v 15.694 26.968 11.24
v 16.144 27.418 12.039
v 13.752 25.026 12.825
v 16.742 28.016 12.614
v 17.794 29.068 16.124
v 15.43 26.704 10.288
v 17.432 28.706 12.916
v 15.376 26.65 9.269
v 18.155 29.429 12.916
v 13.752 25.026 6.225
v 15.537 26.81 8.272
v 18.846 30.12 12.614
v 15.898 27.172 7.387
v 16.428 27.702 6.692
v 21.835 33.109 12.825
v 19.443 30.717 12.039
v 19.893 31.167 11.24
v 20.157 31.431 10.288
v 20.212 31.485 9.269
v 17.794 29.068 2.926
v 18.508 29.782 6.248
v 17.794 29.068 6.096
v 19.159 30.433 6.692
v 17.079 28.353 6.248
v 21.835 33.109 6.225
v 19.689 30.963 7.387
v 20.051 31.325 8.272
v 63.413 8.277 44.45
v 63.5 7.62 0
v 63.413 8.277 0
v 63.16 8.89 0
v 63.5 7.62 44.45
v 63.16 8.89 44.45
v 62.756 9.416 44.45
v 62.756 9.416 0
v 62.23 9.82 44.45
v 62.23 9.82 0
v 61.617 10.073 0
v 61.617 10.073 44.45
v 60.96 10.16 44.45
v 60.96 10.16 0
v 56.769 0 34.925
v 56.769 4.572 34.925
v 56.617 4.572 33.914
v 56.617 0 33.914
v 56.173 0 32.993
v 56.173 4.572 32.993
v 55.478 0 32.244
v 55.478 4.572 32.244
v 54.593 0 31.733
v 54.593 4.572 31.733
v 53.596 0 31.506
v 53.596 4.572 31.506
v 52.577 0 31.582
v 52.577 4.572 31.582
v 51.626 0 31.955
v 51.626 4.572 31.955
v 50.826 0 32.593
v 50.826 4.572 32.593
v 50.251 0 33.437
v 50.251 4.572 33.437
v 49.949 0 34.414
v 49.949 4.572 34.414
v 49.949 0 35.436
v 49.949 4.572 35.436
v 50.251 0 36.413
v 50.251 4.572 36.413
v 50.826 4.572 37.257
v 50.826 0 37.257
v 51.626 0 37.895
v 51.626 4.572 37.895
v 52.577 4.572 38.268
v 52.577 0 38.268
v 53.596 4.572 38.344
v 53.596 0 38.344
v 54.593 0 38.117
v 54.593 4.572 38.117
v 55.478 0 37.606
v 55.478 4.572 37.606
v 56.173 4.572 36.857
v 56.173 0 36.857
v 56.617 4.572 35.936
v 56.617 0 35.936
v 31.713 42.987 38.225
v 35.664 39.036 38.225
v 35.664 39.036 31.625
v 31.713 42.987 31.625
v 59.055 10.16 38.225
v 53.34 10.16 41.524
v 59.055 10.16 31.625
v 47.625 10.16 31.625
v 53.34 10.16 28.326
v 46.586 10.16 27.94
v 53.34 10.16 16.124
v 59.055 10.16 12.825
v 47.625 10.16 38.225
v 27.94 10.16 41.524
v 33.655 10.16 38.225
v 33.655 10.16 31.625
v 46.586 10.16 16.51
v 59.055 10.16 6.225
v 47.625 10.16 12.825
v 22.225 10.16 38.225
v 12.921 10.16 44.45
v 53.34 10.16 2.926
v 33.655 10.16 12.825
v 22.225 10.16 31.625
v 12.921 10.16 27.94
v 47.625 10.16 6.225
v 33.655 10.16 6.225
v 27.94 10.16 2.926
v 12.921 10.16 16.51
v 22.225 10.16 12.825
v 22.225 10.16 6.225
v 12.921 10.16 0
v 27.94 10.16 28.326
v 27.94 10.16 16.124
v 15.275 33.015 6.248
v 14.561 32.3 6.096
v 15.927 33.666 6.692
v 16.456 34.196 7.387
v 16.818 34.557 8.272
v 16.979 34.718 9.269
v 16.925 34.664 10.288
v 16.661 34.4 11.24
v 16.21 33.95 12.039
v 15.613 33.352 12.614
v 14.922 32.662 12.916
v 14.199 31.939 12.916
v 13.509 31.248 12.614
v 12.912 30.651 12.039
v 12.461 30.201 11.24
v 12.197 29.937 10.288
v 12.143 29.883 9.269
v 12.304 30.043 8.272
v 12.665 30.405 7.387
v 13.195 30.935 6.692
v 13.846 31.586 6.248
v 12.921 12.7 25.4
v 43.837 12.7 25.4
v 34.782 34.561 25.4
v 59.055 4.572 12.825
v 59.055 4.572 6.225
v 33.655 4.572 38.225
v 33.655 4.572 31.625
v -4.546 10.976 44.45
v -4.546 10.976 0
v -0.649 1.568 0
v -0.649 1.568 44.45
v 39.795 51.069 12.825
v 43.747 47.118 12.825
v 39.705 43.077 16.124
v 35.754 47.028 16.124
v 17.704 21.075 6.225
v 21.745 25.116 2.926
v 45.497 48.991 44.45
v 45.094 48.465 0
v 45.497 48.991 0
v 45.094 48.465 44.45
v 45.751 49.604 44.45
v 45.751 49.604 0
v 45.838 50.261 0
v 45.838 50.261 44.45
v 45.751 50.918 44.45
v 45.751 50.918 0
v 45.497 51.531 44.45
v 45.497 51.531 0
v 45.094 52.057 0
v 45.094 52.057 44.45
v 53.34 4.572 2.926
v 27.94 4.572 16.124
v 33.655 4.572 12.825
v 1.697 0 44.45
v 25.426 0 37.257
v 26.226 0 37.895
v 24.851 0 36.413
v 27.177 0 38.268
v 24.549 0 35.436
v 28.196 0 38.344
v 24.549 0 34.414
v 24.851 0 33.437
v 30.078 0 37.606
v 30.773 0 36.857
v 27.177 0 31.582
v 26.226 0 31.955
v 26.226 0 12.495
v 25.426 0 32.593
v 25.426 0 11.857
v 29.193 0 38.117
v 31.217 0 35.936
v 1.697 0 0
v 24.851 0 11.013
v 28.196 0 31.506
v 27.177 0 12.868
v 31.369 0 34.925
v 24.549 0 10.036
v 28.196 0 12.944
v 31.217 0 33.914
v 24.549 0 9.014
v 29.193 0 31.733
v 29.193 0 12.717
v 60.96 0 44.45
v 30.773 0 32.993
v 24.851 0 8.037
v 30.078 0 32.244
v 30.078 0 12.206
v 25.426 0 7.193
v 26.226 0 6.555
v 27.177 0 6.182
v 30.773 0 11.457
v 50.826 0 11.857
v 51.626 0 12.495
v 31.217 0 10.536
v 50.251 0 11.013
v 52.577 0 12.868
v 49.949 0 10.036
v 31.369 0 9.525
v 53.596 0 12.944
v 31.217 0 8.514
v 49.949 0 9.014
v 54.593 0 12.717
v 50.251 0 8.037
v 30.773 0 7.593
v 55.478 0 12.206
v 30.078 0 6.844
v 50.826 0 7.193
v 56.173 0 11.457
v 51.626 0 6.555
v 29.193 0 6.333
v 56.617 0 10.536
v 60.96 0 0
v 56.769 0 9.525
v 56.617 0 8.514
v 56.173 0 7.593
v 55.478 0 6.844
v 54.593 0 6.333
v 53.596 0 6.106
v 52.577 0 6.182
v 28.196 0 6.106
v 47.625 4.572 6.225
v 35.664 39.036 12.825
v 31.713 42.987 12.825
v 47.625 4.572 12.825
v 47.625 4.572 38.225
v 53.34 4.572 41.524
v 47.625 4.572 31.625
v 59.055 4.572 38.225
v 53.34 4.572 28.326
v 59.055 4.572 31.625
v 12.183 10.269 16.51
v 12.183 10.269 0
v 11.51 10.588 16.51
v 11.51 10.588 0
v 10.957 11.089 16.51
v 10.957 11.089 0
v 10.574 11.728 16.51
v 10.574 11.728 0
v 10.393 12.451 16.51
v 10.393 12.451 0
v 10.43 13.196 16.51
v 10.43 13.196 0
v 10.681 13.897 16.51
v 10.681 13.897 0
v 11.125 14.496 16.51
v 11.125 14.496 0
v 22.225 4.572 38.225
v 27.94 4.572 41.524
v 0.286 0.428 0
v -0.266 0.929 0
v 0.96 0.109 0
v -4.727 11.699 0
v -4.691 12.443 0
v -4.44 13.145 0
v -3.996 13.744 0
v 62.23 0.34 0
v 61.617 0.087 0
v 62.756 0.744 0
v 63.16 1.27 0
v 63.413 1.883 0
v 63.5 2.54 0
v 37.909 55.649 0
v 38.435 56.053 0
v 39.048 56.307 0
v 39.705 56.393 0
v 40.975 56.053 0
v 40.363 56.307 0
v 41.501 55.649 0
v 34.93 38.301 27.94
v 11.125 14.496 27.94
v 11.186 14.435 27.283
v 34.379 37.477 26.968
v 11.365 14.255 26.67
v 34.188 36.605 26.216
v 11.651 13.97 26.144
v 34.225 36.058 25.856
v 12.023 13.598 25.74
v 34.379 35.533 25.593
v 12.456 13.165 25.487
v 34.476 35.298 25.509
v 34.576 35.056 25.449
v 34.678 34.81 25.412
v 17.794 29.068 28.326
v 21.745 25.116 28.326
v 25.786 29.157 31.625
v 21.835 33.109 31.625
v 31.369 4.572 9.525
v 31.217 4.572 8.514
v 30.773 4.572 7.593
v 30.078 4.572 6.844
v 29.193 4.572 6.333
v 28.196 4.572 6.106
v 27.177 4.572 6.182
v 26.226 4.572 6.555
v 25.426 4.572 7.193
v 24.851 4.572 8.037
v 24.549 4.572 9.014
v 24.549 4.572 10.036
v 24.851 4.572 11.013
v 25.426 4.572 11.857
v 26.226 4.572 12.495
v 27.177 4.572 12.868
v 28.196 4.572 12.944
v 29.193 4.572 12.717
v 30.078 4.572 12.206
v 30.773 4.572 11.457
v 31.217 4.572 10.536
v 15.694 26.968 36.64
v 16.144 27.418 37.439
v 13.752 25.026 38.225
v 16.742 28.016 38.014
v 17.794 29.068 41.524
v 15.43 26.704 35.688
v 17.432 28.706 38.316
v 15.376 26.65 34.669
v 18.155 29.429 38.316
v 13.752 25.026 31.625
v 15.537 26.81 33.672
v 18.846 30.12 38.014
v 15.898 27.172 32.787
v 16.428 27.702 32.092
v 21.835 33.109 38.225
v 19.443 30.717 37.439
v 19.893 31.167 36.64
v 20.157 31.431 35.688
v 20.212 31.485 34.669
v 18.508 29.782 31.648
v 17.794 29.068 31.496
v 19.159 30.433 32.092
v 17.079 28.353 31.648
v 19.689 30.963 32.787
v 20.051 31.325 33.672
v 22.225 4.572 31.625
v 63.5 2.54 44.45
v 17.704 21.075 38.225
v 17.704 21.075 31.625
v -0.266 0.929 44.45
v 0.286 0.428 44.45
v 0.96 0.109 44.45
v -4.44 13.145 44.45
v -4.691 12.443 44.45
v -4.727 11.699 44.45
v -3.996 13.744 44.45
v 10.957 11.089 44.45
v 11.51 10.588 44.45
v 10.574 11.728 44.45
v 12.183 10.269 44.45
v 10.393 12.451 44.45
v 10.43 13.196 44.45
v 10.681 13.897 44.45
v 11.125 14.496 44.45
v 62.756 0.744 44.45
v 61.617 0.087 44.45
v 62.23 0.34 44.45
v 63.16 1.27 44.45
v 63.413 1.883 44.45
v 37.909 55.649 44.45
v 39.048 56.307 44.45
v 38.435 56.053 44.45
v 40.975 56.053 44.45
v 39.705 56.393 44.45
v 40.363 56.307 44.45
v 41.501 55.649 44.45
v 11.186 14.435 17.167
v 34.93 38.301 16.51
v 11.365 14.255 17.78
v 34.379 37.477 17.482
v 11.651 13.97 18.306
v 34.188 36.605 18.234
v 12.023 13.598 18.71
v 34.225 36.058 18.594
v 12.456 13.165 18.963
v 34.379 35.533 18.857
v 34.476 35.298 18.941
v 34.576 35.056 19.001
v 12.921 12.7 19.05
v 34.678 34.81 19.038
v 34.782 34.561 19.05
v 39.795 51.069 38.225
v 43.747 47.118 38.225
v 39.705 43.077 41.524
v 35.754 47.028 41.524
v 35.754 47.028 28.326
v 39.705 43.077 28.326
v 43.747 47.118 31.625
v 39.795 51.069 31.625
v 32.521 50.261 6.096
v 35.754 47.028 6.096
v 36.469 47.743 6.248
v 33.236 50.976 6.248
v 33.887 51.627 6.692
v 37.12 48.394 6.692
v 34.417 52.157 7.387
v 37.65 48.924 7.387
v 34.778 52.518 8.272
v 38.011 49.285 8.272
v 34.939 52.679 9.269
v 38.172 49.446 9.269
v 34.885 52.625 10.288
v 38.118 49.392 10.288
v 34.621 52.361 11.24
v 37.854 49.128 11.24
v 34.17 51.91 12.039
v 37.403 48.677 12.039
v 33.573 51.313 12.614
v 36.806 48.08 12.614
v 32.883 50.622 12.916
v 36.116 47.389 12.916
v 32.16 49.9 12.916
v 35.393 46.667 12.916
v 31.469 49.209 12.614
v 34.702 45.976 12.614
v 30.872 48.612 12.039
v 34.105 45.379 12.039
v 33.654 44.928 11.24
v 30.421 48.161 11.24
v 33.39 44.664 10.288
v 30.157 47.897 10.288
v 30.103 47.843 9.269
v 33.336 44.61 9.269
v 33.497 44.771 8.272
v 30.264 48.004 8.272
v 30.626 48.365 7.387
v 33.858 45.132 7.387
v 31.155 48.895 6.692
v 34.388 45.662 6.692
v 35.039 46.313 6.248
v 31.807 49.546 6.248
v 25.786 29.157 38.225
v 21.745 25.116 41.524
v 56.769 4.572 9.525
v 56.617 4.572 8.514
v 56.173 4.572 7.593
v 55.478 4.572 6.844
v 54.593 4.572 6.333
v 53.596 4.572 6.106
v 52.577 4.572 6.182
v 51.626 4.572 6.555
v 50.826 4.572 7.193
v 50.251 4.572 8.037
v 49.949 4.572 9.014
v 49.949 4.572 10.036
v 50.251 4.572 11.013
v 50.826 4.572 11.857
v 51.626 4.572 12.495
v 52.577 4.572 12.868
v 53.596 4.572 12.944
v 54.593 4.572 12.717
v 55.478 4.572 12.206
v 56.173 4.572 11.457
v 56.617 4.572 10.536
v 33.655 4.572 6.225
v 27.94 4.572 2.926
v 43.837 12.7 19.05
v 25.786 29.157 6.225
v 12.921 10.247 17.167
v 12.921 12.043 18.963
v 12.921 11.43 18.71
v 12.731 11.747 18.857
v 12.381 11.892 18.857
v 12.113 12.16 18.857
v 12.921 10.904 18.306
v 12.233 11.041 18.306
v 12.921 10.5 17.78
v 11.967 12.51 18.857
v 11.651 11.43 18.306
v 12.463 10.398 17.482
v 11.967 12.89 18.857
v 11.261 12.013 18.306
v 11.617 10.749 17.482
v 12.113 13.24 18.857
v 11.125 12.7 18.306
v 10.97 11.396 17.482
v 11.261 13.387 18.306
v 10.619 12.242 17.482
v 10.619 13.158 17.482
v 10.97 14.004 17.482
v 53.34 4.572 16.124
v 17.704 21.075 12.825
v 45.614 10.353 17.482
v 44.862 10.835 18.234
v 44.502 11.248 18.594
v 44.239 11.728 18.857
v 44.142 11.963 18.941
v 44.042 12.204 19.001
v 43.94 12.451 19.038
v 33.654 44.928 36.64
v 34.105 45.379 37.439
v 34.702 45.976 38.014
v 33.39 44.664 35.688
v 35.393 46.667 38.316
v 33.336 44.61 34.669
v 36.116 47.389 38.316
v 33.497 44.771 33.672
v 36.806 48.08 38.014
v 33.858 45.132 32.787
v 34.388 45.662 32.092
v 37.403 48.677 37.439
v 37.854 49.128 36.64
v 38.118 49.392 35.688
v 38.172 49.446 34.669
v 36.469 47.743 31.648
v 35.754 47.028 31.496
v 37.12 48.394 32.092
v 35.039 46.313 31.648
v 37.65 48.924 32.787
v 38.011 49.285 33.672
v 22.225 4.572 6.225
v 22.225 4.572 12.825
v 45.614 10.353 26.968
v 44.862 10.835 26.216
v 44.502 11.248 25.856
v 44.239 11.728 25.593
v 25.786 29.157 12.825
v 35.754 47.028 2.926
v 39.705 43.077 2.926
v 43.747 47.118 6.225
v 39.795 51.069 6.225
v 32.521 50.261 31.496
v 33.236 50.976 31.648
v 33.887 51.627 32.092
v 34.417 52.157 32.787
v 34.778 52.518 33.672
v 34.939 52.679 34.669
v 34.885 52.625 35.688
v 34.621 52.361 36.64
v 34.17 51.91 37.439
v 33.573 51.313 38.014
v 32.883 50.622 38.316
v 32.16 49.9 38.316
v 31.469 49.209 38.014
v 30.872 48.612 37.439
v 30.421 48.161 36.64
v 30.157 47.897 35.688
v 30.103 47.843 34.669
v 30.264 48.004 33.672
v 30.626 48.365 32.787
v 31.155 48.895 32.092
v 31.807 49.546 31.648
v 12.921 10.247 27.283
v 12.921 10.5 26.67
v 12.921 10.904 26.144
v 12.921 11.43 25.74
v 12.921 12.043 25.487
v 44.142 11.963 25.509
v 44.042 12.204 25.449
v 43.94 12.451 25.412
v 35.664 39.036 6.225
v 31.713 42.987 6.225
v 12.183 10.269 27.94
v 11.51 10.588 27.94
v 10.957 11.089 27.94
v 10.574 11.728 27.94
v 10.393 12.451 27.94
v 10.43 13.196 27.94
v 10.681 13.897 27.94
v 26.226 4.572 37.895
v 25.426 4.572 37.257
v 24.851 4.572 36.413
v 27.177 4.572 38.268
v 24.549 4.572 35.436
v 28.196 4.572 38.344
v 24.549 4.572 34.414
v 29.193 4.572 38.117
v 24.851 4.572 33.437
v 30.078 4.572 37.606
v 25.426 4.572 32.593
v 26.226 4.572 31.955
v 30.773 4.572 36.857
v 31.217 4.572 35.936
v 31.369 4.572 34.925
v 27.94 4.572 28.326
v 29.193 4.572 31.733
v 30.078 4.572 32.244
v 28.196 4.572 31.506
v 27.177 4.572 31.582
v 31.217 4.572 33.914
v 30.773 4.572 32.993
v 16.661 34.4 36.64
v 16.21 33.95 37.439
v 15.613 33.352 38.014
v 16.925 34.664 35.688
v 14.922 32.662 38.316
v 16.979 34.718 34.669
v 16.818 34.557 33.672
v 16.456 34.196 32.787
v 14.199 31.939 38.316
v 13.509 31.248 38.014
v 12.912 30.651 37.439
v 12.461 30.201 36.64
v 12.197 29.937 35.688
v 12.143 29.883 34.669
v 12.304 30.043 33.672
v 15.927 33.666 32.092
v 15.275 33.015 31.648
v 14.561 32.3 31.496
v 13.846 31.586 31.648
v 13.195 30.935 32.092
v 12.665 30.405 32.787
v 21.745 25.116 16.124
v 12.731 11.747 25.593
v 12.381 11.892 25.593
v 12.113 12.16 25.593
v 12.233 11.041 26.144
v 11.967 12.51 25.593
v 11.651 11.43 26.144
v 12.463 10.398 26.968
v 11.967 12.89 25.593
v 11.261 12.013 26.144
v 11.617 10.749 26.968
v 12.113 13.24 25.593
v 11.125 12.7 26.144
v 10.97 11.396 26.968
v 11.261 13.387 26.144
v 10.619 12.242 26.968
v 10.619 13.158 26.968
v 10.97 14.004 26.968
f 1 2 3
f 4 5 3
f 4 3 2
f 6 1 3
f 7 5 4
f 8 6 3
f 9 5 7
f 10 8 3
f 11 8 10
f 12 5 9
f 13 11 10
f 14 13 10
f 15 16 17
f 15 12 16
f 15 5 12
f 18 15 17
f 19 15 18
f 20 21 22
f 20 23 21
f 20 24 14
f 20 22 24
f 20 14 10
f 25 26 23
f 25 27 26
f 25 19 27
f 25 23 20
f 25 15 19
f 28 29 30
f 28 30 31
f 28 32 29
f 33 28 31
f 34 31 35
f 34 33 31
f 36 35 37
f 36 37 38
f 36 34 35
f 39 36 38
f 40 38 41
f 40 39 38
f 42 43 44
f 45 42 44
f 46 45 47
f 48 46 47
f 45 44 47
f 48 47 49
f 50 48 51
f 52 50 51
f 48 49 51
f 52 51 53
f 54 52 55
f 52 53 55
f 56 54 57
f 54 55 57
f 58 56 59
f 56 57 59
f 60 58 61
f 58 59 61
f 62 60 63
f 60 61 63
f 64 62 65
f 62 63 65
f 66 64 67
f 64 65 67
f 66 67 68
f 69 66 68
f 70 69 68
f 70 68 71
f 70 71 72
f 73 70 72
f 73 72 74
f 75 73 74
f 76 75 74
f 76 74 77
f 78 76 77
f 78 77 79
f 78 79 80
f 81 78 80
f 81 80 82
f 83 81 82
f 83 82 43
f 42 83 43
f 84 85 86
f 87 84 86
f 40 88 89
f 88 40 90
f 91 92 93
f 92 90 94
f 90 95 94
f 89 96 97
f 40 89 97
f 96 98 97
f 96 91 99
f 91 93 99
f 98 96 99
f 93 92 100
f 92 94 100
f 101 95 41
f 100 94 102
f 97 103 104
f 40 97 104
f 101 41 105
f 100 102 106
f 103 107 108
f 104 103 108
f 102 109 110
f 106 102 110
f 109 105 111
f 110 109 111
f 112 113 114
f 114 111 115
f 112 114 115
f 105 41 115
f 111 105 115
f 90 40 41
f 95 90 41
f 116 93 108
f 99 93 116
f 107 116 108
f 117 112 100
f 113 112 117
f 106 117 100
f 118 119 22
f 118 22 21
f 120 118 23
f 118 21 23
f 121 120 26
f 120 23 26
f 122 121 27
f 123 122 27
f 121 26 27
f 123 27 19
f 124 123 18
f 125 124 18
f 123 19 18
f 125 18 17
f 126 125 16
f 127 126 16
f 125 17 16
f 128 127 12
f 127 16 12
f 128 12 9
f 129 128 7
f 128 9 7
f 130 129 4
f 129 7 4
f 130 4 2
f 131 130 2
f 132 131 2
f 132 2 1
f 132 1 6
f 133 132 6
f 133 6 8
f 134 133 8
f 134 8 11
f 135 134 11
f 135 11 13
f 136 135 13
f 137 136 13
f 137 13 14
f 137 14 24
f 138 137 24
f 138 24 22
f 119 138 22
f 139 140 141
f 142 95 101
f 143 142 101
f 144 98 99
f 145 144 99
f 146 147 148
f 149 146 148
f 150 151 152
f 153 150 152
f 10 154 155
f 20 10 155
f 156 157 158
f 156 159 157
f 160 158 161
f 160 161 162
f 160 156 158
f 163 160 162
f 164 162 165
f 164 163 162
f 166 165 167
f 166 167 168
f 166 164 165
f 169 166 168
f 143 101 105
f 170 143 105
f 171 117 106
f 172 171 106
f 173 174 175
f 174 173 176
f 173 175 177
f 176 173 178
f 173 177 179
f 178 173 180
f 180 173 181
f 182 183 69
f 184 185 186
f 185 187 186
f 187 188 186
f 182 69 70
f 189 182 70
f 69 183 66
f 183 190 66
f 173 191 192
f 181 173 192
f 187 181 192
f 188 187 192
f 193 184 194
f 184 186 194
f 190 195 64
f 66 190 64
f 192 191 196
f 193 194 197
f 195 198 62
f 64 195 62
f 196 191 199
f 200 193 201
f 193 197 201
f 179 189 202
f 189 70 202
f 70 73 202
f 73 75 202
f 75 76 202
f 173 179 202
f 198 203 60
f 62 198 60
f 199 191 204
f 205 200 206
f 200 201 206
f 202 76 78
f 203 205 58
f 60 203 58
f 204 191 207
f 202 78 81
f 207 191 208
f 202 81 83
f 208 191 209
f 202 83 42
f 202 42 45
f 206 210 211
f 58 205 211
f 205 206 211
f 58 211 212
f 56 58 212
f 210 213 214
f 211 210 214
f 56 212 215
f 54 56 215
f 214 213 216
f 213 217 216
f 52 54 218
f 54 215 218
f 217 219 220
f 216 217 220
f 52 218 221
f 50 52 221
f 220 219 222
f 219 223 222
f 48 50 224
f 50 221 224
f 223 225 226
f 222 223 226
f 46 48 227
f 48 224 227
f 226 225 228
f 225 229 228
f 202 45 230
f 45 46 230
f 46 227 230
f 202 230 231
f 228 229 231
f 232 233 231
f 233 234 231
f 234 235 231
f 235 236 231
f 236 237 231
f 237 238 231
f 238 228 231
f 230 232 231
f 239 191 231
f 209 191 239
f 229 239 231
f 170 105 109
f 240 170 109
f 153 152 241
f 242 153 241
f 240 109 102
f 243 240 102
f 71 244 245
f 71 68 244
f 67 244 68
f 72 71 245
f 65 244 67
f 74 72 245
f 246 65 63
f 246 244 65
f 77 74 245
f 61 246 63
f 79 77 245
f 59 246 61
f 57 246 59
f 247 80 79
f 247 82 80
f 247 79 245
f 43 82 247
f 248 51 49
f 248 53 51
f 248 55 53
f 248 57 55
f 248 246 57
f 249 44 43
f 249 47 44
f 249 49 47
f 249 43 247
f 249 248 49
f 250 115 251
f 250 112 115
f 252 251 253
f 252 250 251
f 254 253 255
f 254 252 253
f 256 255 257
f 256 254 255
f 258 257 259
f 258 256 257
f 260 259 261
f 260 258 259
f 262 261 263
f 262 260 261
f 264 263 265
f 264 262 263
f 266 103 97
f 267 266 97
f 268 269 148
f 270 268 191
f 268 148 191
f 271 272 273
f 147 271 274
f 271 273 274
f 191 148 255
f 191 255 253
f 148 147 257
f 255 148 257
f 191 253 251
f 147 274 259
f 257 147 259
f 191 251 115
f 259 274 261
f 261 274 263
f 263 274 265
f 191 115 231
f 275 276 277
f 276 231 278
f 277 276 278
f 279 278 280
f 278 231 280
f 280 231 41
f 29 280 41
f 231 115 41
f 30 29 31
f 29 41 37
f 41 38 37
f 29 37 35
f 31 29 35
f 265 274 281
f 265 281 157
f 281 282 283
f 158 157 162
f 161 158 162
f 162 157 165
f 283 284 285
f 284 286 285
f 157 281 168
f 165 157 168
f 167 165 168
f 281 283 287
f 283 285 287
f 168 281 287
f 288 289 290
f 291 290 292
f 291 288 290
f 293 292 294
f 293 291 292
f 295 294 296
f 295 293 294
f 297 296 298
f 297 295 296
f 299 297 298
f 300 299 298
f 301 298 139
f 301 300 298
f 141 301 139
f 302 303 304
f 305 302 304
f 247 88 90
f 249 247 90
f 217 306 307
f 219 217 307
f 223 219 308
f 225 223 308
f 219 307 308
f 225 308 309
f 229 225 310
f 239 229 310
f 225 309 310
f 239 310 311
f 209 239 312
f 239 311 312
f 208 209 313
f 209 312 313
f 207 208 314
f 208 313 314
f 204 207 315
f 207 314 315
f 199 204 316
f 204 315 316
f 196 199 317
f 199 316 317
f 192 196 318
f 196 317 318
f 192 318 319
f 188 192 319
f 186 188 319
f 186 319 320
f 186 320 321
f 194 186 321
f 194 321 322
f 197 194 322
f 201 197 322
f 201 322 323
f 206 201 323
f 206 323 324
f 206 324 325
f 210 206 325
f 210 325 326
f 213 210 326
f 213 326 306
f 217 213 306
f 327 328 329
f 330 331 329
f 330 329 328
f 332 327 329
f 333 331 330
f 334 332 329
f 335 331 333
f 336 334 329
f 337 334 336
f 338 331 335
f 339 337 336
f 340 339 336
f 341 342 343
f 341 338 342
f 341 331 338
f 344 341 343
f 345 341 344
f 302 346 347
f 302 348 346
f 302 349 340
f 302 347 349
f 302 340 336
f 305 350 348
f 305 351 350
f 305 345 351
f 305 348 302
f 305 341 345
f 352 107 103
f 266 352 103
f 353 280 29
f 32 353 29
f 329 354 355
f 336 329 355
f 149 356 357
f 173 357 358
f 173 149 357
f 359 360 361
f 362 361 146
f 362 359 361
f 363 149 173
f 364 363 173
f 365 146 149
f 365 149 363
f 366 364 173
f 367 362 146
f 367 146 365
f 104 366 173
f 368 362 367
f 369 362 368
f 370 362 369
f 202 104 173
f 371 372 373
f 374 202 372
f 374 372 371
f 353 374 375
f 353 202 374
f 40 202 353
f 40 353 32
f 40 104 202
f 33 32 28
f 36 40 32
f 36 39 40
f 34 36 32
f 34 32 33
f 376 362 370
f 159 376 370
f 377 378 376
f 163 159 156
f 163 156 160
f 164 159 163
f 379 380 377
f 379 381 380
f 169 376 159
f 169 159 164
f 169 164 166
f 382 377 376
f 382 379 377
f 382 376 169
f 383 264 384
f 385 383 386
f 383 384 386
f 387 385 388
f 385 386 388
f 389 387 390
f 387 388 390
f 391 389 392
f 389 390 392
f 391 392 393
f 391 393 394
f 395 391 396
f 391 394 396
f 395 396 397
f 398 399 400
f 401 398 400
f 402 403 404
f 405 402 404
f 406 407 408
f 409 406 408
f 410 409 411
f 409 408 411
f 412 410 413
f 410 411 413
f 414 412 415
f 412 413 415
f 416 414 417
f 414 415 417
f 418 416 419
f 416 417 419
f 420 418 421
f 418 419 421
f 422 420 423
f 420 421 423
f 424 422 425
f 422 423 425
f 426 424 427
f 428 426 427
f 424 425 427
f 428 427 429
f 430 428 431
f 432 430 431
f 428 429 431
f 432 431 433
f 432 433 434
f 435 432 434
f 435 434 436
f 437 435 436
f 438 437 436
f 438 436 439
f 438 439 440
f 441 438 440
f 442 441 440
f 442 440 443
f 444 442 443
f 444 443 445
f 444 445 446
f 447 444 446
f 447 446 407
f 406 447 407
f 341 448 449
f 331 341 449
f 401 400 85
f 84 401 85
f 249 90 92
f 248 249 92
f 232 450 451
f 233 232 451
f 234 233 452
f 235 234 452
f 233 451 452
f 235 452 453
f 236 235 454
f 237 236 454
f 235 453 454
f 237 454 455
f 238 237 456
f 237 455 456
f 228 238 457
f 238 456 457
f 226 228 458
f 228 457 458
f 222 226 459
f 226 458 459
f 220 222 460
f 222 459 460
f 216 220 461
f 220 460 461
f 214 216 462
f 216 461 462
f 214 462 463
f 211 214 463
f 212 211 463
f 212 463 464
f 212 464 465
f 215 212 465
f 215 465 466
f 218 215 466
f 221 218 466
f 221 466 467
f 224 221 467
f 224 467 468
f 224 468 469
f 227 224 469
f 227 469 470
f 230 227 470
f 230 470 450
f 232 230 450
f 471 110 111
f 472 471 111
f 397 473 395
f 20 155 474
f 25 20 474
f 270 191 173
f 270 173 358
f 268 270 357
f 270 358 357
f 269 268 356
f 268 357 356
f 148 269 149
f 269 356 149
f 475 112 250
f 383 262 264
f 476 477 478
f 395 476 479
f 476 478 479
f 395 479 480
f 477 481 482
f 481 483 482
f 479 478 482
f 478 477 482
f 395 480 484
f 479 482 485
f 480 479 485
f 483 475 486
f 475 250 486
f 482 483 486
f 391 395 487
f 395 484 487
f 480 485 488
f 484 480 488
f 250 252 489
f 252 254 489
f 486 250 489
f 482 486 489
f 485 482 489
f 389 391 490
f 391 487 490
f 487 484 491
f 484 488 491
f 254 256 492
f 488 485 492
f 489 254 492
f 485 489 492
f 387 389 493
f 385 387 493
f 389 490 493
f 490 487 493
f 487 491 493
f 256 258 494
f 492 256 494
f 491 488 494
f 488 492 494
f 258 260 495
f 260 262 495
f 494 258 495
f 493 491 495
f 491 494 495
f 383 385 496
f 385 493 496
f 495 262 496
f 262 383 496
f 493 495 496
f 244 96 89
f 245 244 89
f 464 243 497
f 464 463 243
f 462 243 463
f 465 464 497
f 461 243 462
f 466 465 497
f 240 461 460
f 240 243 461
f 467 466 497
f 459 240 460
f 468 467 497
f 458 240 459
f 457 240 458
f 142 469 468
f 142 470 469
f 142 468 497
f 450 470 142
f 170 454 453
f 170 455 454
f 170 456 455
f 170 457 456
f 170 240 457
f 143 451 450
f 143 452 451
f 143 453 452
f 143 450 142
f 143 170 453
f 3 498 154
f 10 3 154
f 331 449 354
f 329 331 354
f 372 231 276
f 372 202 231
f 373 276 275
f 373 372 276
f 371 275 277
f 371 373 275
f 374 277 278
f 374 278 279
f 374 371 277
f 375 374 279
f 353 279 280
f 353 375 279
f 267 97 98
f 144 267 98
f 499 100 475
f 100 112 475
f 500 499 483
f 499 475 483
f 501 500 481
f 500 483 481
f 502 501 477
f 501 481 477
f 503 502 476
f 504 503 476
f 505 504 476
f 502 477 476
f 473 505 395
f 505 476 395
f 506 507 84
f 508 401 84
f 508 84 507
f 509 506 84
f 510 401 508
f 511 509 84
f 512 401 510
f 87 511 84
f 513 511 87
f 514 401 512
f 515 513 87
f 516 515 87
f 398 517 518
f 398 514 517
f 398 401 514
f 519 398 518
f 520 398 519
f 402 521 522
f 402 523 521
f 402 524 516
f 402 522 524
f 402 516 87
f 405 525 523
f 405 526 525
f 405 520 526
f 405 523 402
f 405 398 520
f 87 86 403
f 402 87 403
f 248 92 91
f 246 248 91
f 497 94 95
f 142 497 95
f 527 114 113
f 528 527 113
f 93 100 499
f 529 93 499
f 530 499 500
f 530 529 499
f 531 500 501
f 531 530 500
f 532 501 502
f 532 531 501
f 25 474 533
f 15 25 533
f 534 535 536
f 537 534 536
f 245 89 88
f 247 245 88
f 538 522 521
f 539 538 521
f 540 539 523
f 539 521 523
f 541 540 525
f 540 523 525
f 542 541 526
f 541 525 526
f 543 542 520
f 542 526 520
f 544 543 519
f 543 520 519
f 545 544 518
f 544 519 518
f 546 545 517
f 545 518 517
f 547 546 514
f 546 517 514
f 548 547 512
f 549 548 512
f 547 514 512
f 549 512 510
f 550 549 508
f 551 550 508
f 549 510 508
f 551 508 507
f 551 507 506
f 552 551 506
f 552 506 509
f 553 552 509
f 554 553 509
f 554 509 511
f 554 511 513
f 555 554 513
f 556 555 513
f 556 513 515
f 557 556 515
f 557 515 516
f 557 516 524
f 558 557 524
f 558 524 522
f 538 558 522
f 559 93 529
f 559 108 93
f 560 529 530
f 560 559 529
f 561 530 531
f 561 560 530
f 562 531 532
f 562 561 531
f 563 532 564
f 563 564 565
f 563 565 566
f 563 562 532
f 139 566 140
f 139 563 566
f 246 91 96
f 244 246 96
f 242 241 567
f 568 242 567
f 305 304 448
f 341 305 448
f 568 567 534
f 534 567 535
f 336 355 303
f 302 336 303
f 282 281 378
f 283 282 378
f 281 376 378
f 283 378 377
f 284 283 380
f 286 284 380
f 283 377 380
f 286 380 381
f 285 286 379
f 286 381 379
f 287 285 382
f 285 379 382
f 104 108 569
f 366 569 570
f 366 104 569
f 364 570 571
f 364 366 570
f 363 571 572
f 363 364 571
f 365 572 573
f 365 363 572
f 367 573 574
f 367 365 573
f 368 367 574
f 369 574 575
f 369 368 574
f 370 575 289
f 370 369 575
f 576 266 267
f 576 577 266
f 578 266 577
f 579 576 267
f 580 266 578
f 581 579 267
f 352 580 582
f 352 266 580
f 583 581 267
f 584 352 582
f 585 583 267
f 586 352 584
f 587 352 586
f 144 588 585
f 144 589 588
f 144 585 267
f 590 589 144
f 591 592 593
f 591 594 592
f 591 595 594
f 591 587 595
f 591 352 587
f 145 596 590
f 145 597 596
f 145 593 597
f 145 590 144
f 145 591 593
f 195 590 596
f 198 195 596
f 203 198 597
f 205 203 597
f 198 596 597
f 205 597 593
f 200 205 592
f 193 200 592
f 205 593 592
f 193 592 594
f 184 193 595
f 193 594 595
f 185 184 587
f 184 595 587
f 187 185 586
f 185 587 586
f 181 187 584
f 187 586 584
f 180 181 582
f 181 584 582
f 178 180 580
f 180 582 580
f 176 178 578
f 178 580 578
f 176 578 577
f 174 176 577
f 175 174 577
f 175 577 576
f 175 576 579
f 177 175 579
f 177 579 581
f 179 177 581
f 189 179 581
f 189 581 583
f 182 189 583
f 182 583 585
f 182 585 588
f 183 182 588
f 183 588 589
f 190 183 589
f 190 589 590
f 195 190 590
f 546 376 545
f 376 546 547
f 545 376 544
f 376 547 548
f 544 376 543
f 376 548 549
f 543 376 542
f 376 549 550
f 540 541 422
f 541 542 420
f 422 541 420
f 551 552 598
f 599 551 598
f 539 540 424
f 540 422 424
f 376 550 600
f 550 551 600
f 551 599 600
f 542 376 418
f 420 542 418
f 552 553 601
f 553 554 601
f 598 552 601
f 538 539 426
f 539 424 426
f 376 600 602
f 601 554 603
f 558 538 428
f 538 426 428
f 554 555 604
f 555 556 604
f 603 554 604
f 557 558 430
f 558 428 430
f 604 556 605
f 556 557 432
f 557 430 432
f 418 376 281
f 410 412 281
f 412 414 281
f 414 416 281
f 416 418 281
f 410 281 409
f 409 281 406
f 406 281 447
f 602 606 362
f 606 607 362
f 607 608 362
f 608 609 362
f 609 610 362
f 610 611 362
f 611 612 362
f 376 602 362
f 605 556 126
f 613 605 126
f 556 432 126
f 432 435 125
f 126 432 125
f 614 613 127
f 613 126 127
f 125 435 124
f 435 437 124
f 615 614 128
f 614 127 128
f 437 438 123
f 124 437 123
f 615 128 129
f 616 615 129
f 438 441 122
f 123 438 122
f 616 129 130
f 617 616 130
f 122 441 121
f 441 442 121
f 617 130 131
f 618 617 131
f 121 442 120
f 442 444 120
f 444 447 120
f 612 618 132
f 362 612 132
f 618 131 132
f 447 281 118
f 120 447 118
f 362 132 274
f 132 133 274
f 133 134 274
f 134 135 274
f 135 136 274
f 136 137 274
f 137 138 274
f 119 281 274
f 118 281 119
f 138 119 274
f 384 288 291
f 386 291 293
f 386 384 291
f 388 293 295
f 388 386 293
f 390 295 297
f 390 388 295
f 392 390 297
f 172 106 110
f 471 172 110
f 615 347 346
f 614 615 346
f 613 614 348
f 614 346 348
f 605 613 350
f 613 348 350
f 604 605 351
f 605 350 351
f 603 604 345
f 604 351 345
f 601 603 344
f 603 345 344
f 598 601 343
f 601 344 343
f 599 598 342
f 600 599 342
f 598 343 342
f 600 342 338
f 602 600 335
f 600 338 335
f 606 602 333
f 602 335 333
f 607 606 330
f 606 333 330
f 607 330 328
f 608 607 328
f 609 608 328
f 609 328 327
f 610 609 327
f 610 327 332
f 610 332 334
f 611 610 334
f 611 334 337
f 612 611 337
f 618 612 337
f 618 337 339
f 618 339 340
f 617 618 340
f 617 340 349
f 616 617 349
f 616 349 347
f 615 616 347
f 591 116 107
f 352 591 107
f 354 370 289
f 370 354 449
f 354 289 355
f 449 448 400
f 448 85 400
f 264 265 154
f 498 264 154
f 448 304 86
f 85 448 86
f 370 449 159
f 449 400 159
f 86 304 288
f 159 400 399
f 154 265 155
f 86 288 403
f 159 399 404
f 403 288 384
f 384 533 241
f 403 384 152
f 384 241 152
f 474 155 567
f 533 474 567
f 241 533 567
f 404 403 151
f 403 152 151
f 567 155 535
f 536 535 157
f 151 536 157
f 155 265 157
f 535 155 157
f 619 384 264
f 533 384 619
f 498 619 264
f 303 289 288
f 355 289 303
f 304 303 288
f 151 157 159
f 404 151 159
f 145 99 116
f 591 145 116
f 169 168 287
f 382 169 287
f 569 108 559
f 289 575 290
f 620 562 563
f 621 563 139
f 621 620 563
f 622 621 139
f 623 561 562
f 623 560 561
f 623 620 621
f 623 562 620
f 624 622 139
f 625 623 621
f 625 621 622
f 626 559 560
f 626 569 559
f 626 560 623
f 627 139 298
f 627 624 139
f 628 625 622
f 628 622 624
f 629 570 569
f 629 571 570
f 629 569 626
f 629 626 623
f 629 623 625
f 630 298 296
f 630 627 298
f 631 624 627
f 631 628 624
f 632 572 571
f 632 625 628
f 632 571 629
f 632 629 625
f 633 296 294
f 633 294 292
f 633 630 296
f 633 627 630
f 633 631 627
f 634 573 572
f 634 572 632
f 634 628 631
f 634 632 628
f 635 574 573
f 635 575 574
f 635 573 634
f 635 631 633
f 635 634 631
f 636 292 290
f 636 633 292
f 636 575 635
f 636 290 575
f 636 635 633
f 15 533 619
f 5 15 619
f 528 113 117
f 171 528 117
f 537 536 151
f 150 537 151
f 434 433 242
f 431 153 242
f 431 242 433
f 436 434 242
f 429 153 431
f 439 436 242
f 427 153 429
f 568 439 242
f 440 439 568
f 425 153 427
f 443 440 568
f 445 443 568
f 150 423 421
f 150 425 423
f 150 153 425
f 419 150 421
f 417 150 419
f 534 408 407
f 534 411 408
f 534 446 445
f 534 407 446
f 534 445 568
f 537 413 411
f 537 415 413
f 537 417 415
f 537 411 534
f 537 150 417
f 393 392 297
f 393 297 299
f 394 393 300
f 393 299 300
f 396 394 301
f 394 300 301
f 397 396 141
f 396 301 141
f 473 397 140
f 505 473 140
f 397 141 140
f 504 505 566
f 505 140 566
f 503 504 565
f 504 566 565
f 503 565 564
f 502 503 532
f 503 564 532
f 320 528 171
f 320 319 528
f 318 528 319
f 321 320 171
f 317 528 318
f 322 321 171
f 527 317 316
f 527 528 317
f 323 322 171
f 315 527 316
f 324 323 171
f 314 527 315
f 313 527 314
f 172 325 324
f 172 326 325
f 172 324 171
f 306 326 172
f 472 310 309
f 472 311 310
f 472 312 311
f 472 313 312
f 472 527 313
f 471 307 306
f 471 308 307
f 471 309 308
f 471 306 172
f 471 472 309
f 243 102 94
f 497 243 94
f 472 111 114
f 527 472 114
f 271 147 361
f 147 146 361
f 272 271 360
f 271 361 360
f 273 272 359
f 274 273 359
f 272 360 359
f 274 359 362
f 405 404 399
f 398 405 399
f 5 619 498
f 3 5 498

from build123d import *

# Parameters (mm, degrees)
BOSS_EXTRUDE1_DEPTH = 44.45
SKETCH2_R           = 3.429
CUT_EXTRUDE1_DEPTH  = 44.45
SKETCH3_R           = 3.429
CUT_EXTRUDE2_DEPTH  = 44.45
CUT_EXTRUDE3_DEPTH  = 5.588
CUT_EXTRUDE4_DEPTH  = 5.588
BOSS_EXTRUDE2_DEPTH = 3.175
FILLET1_R           = 2.54


with BuildPart() as part:
    # Sketch1 → Boss-Extrude1 (new body)
    with BuildSketch(Plane.XY):
        Polygon((0, 0), (63.5, 0), (63.5, 10.16), (6.788694961, 10.16), (46.889643324, 50.260948363), (39.705438427, 57.44515326), (-5.195842178, 12.543872654), align=None)
    extrude(amount=BOSS_EXTRUDE1_DEPTH)

    # Sketch2 → Cut-Extrude1 (cut)
    with BuildSketch(Plane(origin=(0, 10.16, 0), x_dir=(1, 0, 0), z_dir=(0, 1, 0))):
        with Locations((53.34, -34.925)):
            Circle(SKETCH2_R)
        with Locations((53.34, -9.525)):
            Circle(SKETCH2_R)
        with Locations((27.94, -9.525)):
            Circle(SKETCH2_R)
        with Locations((27.94, -34.925)):
            Circle(SKETCH2_R)
    extrude(amount=-CUT_EXTRUDE1_DEPTH, mode=Mode.SUBTRACT)

    # Sketch3 → Cut-Extrude2 (cut)
    with BuildSketch(Plane(origin=(-1.685652519, 1.685652519, 0), x_dir=(0, 0, -1), z_dir=(0.707106781, -0.707106781, 0))):
        with Locations((-9.525, 33.135842178)):
            Circle(SKETCH3_R)
        with Locations((-9.525, 58.535842178)):
            Circle(SKETCH3_R)
        with Locations((-34.925, 58.535842178)):
            Circle(SKETCH3_R)
        with Locations((-34.925, 33.135842178)):
            Circle(SKETCH3_R)
    extrude(amount=-CUT_EXTRUDE2_DEPTH, mode=Mode.SUBTRACT)

    # Sketch4 → Cut-Extrude3 (cut)
    with BuildSketch(Plane(origin=(0, 10.16, 0), x_dir=(1, 0, 0), z_dir=(0, 1, 0))):
        Polygon((22.225, -31.625443212), (22.225, -38.224556788), (27.94, -41.524113577), (33.655, -38.224556788), (33.655, -31.625443212), (27.94, -28.325886423), align=None)
        Polygon((47.625, -31.625443212), (47.625, -38.224556788), (53.34, -41.524113577), (59.055, -38.224556788), (59.055, -31.625443212), (53.34, -28.325886423), align=None)
        Polygon((22.225, -6.225443212), (22.225, -12.824556788), (27.94, -16.124113577), (33.655, -12.824556788), (33.655, -6.225443212), (27.94, -2.925886423), align=None)
        Polygon((47.625, -6.225443212), (47.625, -12.824556788), (53.34, -16.124113577), (59.055, -12.824556788), (59.055, -6.225443212), (53.34, -2.925886423), align=None)
    extrude(amount=-CUT_EXTRUDE3_DEPTH, mode=Mode.SUBTRACT)

    # Sketch5 → Cut-Extrude4 (cut)
    with BuildSketch(Plane(origin=(-1.685652519, 1.685652519, 0), x_dir=(0, 0, -1), z_dir=(0.707106781, -0.707106781, 0))):
        Polygon((-2.925886423, 58.535842178), (-6.225443212, 64.250842178), (-12.824556788, 64.250842178), (-16.124113577, 58.535842178), (-12.824556788, 52.820842178), (-6.225443212, 52.820842178), align=None)
        Polygon((-28.325886423, 58.535842178), (-31.625443212, 64.250842178), (-38.224556788, 64.250842178), (-41.524113577, 58.535842178), (-38.224556788, 52.820842178), (-31.625443212, 52.820842178), align=None)
        Polygon((-2.925886423, 33.135842178), (-6.225443212, 38.850842178), (-12.824556788, 38.850842178), (-16.124113577, 33.135842178), (-12.824556788, 27.420842178), (-6.225443212, 27.420842178), align=None)
        Polygon((-28.325886423, 33.135842178), (-31.625443212, 38.850842178), (-38.224556788, 38.850842178), (-41.524113577, 33.135842178), (-38.224556788, 27.420842178), (-31.625443212, 27.420842178), align=None)
    extrude(amount=-CUT_EXTRUDE4_DEPTH, mode=Mode.SUBTRACT)

    # Sketch6 → Boss-Extrude2 (add, symmetric)
    with BuildSketch(Plane.XY.offset(22.225)):
        Polygon((6.788694961, 10.16), (33.729463324, 37.100768363), (44.888694961, 10.16), align=None)
    extrude(amount=BOSS_EXTRUDE2_DEPTH, both=True)

    # Fillet1
    fillet1_edges = [part.edges().sort_by_distance(p)[0] for p in [
        (-5.195842178, 12.543872654, 22.225),
        (39.705438427, 57.44515326, 22.225),
        (46.889643324, 50.260948363, 22.225),
        (6.788694961, 10.16, 34.925),
        (63.5, 10.16, 22.225),
        (63.5, 0, 22.225),
        (0, 0, 22.225),
        (6.788694961, 10.16, 9.525),
        (25.838694961, 10.16, 19.05),
        (44.888694961, 10.16, 22.225),
        (20.259079143, 23.630384182, 19.05),
        (33.729463324, 37.100768363, 22.225),
        (25.838694961, 10.16, 25.4),
        (20.259079143, 23.630384182, 25.4),
    ]]
    fillet(fillet1_edges, radius=FILLET1_R)


solid = part.part
